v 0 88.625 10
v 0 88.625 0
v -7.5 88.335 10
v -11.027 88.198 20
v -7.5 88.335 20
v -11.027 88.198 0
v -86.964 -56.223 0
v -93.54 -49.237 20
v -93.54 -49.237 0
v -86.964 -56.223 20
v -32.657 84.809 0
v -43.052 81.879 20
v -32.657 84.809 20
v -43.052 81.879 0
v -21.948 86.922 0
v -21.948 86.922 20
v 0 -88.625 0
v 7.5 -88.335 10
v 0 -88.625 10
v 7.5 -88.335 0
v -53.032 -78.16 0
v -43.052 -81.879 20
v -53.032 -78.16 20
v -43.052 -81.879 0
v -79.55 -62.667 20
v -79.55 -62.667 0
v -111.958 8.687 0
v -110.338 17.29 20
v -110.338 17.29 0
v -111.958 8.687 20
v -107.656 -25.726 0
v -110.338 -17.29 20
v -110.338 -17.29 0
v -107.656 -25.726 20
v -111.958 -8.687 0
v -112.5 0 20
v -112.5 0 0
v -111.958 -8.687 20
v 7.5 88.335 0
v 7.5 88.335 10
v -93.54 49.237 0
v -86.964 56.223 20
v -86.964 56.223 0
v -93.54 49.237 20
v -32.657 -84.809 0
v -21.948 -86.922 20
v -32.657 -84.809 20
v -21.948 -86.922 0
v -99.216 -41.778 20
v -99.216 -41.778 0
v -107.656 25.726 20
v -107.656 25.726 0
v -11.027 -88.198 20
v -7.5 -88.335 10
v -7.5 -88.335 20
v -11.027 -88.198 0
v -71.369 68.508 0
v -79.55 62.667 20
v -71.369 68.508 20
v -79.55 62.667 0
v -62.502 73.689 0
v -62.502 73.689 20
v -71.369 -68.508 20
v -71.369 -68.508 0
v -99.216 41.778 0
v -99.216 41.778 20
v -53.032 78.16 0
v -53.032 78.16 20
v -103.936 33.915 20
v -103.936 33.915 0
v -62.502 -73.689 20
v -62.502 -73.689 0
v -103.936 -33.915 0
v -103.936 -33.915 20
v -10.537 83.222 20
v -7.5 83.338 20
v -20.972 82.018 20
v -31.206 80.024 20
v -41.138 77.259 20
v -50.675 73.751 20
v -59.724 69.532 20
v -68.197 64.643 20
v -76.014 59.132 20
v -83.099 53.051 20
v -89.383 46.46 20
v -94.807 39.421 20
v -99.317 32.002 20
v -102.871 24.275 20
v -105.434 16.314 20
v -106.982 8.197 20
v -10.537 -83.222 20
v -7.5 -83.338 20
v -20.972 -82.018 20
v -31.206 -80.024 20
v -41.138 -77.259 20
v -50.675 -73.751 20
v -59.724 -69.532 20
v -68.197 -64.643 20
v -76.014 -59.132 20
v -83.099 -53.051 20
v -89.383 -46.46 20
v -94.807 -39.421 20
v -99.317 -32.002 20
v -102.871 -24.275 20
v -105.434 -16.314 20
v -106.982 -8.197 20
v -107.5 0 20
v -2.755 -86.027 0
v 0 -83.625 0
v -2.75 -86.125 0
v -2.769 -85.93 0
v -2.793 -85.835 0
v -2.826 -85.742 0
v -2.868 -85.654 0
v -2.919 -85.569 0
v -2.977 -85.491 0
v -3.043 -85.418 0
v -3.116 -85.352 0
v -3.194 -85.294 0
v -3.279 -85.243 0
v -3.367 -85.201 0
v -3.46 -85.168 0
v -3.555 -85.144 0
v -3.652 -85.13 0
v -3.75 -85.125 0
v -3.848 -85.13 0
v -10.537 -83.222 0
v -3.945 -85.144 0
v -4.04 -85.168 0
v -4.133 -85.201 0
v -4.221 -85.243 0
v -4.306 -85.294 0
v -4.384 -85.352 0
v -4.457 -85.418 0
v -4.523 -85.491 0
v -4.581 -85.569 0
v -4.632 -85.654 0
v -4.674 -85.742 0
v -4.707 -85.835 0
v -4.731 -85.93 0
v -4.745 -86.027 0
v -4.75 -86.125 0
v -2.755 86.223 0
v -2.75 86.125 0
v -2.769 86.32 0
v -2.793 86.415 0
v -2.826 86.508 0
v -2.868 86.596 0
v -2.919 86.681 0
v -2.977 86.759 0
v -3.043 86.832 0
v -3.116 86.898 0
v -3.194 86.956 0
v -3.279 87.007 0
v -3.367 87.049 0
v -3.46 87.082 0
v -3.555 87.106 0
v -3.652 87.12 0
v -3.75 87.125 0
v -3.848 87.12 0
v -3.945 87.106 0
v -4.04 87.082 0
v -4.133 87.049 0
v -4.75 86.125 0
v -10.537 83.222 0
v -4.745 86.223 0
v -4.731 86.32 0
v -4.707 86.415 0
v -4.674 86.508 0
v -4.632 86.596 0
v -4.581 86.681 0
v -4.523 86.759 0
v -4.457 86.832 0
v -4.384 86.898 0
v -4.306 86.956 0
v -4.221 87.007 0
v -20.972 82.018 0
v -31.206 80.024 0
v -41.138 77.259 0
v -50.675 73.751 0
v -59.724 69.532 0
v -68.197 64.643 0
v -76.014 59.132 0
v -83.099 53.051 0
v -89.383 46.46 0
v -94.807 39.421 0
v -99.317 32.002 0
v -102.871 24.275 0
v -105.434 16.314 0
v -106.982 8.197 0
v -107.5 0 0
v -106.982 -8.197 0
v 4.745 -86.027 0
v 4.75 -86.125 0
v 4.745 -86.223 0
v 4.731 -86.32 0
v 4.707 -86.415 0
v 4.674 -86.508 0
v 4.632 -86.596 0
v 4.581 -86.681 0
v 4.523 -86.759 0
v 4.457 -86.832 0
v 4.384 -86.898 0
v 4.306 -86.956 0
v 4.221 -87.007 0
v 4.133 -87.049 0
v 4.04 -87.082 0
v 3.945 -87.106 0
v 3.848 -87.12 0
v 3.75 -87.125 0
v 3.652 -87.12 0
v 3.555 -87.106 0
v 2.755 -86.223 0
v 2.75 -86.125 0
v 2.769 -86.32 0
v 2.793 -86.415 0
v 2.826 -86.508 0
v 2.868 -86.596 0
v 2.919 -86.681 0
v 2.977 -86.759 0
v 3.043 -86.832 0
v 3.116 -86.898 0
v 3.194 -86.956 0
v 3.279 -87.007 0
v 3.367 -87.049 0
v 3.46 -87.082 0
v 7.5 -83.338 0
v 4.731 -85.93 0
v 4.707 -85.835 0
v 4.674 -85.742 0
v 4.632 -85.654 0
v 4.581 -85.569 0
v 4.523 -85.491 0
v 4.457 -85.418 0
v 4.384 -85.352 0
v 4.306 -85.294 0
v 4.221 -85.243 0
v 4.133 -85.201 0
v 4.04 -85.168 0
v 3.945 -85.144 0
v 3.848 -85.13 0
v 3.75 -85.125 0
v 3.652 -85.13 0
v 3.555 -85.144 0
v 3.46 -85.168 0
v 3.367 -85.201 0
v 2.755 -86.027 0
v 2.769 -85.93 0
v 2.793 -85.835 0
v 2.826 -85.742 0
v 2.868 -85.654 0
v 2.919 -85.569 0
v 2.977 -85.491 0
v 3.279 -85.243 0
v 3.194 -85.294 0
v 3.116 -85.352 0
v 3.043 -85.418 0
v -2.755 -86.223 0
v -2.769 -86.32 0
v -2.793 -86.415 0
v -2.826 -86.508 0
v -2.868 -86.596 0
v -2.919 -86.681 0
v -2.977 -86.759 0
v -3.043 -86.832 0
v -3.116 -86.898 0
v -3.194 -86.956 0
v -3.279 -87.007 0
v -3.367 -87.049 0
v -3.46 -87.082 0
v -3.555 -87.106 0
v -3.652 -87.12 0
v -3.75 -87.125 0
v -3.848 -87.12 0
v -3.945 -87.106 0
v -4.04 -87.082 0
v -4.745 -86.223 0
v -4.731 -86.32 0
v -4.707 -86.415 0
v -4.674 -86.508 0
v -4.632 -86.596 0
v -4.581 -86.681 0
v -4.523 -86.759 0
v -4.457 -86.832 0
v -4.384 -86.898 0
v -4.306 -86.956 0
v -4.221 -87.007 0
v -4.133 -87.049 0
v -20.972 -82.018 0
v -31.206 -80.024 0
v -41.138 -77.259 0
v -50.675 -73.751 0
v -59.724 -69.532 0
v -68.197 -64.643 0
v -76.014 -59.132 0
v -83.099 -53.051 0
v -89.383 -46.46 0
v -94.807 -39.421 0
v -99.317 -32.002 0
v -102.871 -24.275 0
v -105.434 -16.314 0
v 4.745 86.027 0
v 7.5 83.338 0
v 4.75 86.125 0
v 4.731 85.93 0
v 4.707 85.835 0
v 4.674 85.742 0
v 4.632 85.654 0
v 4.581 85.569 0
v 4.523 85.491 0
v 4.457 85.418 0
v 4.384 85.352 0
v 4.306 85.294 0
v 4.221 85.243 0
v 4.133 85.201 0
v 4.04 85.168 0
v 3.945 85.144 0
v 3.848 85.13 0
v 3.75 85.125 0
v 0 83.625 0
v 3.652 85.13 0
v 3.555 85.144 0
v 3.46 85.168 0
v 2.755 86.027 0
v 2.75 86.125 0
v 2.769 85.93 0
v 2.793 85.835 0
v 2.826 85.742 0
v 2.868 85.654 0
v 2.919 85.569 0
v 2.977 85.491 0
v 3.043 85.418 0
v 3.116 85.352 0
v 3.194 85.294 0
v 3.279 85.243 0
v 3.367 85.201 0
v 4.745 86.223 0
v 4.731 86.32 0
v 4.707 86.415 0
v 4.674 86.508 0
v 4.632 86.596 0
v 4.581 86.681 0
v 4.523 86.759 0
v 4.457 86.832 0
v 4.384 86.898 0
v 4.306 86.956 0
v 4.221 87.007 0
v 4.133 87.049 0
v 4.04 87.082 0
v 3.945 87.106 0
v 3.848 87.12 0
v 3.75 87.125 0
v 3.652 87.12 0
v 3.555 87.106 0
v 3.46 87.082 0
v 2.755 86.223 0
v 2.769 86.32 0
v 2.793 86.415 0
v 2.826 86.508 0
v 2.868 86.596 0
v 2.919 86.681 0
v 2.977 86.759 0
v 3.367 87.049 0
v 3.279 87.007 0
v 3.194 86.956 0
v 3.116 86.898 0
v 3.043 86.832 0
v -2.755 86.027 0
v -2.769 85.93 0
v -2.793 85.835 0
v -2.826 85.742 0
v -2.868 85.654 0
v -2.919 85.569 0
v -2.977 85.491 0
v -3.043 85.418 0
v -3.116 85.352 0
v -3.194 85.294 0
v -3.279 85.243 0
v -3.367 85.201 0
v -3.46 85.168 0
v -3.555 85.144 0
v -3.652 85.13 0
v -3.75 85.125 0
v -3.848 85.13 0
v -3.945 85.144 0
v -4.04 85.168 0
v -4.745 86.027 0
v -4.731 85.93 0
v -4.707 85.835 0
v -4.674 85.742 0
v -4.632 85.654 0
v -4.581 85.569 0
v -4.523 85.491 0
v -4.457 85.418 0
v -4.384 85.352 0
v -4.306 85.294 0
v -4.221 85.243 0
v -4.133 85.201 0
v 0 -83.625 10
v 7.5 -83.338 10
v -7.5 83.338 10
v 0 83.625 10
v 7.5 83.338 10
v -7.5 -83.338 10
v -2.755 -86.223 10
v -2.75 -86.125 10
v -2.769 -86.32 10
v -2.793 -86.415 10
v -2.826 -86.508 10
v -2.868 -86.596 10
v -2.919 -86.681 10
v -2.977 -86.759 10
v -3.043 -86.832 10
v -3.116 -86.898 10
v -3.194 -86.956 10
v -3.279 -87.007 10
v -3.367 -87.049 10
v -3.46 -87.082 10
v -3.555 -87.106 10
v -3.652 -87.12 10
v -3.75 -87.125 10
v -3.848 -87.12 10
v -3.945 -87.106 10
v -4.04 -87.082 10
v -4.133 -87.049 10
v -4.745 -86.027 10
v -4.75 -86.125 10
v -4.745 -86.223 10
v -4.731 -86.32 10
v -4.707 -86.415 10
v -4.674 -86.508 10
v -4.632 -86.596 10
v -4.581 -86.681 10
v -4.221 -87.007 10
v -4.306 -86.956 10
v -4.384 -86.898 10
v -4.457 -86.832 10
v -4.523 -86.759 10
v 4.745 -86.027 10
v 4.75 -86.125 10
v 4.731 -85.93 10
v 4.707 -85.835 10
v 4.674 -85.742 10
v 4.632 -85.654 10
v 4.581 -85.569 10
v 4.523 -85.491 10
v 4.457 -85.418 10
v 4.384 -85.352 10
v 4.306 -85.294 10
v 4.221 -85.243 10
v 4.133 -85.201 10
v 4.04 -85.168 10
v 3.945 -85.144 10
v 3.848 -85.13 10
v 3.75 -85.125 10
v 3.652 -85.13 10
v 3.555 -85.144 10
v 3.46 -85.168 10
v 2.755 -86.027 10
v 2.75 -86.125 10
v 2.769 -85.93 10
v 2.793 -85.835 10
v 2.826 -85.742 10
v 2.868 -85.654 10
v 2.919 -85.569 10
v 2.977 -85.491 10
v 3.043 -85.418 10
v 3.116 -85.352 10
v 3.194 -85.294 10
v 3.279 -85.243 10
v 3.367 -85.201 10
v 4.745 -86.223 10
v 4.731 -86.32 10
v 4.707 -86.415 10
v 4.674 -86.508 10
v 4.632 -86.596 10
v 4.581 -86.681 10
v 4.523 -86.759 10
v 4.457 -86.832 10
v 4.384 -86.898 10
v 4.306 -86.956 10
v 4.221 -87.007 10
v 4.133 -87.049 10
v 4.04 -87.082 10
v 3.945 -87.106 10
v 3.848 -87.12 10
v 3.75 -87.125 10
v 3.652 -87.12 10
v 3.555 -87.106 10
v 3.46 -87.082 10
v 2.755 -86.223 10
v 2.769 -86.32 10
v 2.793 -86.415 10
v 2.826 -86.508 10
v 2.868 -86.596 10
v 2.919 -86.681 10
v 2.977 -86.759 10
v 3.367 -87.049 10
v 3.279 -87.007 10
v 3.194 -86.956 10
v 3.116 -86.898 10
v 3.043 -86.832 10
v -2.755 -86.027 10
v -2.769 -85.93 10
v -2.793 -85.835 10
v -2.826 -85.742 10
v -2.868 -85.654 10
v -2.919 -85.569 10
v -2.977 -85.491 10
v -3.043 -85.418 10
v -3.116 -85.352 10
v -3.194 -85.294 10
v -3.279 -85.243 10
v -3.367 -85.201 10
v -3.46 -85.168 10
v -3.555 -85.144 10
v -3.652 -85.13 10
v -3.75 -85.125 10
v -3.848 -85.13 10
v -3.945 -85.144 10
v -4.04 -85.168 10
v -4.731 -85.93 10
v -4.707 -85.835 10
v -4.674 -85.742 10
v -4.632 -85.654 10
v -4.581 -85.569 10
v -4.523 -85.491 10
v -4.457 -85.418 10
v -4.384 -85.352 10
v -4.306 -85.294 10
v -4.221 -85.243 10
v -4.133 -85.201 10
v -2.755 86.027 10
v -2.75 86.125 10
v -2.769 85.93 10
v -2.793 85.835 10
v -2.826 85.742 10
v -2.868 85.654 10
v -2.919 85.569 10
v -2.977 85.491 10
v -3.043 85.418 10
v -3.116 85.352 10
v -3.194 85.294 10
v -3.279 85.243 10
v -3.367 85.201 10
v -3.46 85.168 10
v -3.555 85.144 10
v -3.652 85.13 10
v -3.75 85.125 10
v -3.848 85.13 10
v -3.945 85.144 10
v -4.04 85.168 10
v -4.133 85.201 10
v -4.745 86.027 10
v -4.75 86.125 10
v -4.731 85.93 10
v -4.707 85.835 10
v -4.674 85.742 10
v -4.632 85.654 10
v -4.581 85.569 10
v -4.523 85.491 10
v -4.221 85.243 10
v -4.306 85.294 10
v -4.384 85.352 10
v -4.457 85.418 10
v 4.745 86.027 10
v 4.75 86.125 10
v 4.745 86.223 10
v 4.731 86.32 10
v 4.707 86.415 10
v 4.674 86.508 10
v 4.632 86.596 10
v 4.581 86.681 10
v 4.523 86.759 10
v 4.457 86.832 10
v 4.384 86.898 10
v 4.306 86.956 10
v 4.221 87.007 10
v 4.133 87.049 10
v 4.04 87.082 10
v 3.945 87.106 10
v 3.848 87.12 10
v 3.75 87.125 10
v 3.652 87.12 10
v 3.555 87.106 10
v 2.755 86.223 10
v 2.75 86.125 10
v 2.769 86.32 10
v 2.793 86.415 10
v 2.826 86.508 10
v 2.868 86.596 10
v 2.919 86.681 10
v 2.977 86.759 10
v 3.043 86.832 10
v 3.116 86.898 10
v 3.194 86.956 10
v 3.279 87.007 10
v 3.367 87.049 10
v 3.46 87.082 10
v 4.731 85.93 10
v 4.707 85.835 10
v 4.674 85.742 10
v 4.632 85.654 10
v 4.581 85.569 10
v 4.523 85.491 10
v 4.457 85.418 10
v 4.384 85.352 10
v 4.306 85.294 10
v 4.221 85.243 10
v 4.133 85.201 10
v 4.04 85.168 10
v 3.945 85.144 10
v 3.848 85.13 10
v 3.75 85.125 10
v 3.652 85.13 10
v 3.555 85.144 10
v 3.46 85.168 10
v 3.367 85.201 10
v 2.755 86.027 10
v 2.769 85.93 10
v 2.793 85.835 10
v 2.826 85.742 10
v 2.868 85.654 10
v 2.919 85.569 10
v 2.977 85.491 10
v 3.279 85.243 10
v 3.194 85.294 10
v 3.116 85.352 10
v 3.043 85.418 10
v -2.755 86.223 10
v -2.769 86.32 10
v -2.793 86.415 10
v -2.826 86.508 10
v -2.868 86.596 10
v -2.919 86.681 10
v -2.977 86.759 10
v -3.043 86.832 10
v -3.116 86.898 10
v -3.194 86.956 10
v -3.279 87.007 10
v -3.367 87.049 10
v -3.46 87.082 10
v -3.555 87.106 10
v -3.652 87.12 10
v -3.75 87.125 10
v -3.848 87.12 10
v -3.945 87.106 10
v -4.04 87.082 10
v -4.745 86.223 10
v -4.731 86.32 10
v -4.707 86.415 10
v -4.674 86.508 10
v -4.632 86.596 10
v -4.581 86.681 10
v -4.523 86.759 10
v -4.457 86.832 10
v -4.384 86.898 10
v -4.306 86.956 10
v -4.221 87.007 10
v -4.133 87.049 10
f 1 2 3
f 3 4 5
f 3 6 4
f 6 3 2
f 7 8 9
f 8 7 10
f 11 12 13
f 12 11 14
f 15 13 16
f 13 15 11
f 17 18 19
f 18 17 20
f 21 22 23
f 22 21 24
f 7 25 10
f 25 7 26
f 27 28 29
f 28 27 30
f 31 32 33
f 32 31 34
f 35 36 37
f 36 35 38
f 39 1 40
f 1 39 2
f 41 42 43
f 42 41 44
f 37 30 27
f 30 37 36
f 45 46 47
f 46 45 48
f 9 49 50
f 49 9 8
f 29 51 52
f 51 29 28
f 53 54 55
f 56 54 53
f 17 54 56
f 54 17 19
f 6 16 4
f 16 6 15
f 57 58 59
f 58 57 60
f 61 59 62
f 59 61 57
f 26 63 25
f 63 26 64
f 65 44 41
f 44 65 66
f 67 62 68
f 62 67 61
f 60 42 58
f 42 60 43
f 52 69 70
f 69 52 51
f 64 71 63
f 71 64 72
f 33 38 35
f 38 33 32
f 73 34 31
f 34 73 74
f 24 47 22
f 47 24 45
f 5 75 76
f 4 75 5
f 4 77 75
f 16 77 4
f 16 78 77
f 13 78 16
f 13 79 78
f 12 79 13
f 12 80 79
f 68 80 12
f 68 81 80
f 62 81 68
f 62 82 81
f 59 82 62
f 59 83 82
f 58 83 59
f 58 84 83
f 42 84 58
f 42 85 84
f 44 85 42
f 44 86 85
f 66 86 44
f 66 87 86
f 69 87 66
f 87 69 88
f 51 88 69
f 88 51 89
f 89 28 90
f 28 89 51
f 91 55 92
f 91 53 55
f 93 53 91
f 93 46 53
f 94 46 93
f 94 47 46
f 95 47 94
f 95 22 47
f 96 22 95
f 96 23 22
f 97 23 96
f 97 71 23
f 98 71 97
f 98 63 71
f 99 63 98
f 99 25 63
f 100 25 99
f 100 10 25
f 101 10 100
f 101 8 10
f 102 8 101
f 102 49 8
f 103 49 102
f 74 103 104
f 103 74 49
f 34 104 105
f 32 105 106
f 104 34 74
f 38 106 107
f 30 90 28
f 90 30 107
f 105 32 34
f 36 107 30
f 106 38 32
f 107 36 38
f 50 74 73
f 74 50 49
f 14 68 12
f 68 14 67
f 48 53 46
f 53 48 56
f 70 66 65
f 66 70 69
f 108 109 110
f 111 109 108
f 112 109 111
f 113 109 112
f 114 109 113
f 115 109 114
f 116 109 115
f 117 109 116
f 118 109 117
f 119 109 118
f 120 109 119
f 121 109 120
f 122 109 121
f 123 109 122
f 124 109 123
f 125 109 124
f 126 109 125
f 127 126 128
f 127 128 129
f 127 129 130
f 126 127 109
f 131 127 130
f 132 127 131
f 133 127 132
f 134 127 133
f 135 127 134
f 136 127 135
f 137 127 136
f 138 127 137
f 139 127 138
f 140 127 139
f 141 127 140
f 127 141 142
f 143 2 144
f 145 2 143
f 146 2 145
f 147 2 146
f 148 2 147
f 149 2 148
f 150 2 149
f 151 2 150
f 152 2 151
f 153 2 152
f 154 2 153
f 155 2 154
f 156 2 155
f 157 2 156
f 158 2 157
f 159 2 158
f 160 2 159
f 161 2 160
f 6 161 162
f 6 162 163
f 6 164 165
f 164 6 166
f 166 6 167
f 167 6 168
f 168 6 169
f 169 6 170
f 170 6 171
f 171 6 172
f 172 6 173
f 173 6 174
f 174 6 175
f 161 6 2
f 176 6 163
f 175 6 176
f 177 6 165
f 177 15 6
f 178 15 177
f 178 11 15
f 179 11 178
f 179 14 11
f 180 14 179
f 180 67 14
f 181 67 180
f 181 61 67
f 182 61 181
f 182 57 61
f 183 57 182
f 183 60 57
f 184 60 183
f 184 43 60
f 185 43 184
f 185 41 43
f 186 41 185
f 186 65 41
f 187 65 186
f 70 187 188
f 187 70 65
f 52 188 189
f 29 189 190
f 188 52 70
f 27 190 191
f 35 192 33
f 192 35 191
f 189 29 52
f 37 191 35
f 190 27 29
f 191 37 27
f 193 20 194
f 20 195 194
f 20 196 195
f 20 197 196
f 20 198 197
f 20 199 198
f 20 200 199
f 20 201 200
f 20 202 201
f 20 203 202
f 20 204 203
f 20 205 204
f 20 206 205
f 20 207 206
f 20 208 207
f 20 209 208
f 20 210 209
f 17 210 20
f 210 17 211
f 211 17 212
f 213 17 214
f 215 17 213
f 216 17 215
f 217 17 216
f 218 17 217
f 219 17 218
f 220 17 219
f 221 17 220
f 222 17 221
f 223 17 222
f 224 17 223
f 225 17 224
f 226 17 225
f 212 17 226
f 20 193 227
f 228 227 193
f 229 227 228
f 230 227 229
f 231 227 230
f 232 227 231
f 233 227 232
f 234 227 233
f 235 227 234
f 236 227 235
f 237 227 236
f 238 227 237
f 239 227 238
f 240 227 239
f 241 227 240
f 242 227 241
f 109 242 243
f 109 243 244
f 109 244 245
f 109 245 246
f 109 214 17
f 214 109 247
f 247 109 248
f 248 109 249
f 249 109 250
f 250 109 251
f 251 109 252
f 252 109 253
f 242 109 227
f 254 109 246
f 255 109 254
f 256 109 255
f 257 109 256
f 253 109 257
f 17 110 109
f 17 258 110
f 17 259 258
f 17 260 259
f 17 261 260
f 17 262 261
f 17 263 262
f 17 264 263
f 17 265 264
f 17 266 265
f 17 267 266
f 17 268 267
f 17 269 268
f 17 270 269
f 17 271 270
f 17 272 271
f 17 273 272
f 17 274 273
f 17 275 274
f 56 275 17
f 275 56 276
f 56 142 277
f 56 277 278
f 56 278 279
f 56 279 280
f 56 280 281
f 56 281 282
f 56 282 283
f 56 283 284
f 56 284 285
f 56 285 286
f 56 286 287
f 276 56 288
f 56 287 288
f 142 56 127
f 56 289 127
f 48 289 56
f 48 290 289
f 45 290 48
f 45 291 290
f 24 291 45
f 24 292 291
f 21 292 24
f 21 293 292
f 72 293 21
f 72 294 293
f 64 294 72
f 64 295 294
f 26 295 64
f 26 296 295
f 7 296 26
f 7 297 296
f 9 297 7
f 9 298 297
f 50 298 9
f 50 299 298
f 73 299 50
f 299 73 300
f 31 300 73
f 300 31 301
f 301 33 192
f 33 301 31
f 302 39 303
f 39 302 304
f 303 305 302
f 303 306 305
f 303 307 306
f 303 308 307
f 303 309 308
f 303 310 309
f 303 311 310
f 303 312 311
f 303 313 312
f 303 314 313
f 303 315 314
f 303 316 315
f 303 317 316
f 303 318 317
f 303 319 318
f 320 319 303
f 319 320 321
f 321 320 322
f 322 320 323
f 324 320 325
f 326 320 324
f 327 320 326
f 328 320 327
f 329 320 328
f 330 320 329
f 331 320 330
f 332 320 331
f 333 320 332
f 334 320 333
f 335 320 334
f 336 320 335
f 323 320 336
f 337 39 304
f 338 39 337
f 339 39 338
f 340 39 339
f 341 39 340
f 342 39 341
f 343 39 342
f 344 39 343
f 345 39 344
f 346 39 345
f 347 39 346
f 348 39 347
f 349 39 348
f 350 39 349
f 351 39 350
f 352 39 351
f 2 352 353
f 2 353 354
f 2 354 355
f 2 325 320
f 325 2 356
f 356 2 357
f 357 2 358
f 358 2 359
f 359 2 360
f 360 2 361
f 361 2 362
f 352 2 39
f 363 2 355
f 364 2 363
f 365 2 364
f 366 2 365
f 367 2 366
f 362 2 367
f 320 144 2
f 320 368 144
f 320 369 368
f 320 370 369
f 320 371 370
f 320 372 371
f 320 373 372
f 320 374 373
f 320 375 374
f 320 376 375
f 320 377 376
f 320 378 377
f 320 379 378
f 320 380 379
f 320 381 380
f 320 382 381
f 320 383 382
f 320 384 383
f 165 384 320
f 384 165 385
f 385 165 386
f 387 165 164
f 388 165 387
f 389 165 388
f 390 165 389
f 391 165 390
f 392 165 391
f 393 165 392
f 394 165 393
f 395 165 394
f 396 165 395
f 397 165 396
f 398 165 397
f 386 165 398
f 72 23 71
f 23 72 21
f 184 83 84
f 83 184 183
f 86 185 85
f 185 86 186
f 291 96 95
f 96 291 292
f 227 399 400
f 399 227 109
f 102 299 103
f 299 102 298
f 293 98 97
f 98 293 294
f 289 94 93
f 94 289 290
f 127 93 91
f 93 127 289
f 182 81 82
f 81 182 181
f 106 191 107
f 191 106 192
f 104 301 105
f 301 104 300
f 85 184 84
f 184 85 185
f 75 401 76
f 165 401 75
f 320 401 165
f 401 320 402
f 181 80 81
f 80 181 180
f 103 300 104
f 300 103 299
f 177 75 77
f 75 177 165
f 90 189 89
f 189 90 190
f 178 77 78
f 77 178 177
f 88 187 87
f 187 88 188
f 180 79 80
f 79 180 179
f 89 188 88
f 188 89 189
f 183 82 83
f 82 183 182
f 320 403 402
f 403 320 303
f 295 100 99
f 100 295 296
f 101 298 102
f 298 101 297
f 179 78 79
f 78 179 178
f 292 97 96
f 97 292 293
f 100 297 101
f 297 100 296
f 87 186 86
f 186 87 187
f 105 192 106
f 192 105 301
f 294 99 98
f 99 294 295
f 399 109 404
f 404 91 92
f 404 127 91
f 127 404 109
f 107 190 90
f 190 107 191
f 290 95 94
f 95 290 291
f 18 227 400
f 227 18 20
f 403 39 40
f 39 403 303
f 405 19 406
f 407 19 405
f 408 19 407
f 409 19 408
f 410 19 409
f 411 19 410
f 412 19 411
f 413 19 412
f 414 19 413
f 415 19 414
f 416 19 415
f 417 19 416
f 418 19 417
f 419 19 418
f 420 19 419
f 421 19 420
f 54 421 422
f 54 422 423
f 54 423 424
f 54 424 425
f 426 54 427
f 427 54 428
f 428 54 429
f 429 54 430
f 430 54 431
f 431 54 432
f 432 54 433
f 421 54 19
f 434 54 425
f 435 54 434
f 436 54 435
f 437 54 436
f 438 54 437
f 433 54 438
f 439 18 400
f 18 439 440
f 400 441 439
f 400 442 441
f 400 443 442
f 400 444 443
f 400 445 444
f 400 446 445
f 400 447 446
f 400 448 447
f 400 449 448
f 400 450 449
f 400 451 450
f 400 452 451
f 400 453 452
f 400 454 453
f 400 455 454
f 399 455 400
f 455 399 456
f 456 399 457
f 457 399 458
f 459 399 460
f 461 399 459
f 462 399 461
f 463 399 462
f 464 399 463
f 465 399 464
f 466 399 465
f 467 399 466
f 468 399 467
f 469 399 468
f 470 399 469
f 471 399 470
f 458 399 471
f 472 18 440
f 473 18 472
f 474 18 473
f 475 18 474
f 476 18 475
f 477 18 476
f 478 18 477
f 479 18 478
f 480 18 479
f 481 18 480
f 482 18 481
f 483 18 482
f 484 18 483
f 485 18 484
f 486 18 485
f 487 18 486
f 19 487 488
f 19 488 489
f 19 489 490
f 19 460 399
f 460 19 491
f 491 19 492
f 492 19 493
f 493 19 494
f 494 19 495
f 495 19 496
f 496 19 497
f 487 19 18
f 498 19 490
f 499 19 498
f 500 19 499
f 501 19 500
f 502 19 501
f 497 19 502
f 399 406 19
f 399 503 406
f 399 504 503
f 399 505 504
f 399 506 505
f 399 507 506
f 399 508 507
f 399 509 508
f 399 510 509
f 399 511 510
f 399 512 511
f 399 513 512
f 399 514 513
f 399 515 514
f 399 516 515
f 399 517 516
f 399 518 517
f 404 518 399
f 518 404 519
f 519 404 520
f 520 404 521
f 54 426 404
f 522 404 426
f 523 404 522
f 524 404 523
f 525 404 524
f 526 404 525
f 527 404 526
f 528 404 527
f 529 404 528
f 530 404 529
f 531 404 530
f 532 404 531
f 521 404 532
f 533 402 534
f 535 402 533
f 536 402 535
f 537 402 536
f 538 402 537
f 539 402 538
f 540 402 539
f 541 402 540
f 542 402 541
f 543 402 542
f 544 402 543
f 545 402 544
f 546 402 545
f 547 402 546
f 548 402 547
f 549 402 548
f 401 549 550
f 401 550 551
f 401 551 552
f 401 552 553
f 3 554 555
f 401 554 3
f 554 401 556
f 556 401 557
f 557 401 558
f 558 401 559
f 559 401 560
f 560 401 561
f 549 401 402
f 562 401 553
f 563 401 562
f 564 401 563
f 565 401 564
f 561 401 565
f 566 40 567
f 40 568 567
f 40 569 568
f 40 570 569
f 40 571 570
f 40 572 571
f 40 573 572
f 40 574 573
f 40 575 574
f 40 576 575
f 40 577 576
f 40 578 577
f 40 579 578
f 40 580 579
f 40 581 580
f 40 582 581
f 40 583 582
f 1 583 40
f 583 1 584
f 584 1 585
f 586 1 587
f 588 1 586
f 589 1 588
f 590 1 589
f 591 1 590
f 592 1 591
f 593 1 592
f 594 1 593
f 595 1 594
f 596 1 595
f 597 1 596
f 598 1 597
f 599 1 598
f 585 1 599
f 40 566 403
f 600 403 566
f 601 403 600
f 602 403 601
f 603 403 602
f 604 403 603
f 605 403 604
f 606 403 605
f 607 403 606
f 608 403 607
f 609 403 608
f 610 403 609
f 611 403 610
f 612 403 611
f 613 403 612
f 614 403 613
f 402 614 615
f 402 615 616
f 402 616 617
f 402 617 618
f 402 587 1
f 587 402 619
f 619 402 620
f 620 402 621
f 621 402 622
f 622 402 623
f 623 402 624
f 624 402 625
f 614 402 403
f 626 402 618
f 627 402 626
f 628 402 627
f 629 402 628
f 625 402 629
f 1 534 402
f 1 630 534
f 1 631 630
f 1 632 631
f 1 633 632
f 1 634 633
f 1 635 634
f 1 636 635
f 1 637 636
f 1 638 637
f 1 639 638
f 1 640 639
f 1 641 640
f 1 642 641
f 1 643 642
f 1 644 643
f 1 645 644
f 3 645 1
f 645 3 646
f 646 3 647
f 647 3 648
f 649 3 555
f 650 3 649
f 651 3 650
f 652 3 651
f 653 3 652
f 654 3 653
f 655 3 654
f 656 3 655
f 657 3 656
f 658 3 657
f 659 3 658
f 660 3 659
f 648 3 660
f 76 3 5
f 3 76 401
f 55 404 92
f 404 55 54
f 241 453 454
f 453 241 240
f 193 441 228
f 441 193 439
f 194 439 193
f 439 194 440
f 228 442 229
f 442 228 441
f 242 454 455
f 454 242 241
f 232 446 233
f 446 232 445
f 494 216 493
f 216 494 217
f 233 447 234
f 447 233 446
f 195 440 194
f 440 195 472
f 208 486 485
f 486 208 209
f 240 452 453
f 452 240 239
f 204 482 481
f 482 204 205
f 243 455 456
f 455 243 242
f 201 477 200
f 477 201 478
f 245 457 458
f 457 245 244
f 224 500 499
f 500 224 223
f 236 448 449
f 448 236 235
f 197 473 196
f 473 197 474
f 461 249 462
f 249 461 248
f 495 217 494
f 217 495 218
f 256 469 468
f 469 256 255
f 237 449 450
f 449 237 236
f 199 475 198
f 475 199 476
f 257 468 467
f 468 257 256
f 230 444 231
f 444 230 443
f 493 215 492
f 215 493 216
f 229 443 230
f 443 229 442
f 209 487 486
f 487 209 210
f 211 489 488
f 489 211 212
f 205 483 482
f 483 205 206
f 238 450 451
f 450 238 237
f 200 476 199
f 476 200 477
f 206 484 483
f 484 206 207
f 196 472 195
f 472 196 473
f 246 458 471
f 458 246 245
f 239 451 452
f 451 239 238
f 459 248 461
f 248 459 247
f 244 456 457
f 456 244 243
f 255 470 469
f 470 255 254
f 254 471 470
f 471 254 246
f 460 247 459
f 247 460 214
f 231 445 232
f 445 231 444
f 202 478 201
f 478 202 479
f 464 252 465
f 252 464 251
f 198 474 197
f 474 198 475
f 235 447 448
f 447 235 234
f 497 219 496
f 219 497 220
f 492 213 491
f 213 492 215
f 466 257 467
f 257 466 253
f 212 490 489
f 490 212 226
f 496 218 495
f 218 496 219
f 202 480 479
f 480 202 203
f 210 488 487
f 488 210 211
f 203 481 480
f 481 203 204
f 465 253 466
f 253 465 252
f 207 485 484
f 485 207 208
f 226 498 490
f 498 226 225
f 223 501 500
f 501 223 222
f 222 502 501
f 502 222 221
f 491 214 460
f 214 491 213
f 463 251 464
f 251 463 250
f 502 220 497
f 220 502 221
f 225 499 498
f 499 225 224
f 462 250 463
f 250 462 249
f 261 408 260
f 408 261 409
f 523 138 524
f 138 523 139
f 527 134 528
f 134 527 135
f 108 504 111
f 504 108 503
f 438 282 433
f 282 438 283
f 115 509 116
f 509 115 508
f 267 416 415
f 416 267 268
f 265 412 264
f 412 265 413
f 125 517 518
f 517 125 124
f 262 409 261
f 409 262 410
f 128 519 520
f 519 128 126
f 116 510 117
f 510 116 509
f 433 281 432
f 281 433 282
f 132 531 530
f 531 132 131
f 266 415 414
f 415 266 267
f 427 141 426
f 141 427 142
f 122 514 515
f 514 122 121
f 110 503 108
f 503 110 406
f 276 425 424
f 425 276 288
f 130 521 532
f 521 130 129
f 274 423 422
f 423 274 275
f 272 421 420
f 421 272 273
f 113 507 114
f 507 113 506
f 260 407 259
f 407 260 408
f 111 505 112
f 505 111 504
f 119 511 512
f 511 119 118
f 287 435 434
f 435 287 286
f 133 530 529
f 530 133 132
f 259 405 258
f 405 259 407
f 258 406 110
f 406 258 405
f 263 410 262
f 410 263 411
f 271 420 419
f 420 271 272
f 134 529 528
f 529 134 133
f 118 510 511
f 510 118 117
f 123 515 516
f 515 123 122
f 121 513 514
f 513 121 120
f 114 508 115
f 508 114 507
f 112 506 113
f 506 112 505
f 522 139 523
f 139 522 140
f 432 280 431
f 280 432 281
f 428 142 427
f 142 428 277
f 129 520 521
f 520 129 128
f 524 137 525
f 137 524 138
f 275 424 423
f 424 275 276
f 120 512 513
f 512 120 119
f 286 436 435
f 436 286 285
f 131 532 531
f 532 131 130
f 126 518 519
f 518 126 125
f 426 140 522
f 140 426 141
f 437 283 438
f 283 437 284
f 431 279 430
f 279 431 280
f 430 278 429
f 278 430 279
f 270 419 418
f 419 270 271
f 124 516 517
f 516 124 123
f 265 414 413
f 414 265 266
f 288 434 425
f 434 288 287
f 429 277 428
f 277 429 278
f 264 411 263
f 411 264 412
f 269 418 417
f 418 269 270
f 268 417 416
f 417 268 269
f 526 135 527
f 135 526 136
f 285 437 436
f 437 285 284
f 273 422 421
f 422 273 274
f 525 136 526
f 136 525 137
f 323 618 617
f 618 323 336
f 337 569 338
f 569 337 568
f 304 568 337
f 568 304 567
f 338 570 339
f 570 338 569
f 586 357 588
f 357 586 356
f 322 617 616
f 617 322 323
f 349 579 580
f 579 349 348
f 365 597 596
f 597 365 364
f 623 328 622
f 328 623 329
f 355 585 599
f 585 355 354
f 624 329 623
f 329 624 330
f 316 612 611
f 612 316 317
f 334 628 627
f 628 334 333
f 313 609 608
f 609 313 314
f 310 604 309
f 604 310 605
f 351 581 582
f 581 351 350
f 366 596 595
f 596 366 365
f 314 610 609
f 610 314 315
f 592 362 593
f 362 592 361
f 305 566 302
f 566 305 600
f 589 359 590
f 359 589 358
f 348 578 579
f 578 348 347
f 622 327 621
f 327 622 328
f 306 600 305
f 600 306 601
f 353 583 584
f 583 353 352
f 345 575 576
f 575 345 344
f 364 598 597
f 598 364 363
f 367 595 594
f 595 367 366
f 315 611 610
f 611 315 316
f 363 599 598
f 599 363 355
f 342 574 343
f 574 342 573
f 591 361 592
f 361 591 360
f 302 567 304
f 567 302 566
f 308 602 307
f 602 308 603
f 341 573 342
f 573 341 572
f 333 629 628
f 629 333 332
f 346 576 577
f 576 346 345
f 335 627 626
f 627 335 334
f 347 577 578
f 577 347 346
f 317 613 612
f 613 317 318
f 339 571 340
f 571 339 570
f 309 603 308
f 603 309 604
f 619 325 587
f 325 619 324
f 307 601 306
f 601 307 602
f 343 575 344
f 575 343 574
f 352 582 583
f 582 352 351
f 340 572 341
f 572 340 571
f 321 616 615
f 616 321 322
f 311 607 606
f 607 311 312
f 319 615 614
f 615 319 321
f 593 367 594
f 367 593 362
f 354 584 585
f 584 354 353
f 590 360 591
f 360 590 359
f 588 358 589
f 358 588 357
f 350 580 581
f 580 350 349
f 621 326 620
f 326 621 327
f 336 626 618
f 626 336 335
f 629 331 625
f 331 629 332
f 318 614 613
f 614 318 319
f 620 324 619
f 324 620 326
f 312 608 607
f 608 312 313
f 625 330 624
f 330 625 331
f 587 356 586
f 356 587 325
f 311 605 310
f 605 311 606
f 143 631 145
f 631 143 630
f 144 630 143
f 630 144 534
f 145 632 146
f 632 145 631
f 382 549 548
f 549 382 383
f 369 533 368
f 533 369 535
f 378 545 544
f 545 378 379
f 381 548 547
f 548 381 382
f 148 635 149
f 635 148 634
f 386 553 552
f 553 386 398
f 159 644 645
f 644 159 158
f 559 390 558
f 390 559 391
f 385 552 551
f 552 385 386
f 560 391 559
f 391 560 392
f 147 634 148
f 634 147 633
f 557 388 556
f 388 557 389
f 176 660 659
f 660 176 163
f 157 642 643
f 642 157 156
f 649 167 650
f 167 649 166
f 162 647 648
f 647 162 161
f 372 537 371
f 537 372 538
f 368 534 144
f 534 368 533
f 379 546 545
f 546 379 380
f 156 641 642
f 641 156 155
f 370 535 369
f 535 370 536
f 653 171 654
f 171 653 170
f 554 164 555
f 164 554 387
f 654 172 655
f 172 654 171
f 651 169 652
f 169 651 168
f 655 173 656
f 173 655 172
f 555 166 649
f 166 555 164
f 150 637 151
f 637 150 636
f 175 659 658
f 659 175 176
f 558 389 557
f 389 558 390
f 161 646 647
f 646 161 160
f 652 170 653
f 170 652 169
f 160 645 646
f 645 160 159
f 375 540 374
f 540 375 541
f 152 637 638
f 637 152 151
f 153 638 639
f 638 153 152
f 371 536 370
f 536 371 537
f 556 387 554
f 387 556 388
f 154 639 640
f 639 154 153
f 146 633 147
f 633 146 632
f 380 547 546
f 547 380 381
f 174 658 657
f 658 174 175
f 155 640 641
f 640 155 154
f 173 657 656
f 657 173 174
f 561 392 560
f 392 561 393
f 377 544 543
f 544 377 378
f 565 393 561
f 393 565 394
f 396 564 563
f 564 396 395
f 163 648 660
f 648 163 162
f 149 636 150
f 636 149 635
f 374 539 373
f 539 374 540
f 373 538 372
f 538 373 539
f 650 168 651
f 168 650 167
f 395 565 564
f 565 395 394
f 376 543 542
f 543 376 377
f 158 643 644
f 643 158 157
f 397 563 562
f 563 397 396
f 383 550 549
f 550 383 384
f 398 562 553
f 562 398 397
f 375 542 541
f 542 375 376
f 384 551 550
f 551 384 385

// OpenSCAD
// file: formwork_oval.scad
$fn = 64;

/* elliptical_cylinder BEGIN */
module elliptical_cylinder(major, minor, height) {
    scale([major / 2, minor / 2, 1])
        cylinder(d = 2, h = height);
}
/* elliptical_cylinder END */

/* elliptical_formwork BEGIN */
module elliptical_formwork(outer_major, outer_minor, wall, height) {
    difference_shape_height = height * 2;

    difference() {
        elliptical_cylinder(outer_major + 2 * wall, outer_minor + 2 * wall, height);
        translate(
            [
            0,
            0,
                -difference_shape_height / 4
            ]
        ) {
            elliptical_cylinder(outer_major, outer_minor, difference_shape_height);
        }
    }
}
/* elliptical_formwork END */

// elliptical_formwork_with_cutouts BEGIN
module elliptical_formwork_with_cutouts(outer_major, outer_minor, wall, height, key) {
    difference() {
        difference() {
            difference_shape_height = height * 2;
            color("green") elliptical_formwork(outer_major, outer_minor, wall, height);

            translate(
                [
                        outer_minor / 2 + key / 2,
                0,
                    difference_shape_height / 4
                ]
            ) {
                cube(
                    [outer_minor, outer_major, difference_shape_height],
                center = true
                );
            }
        }

        translate(
            [
                0,
            0,
                    height / 2 + height / 4
            ]
        ) {
            cube(
                [key, outer_minor + wall * 2, height / 2],
            center = true
            );
        }

        translate(
            [
                key / 4,
                    -outer_minor / 2 - wall / 2,
                height / 4
            ]
        ) {
            #cylinder(
            height,
            1,
            1,
            center = true
            );
        }

        translate(
            [
                    +key / 4 - key / 2,
                    -outer_minor / 2 - wall / 2,
                height / 4
            ]
        ) {
            #cylinder(
            height,
            1,
            1,
            center = true
            );
        }

        translate(
            [
                key / 4,
                    outer_minor / 2 + wall / 2,
                height / 4
            ]
        ) {
            #cylinder(
            height,
            1,
            1,
            center = true
            );
        }

        translate(
            [
                    +key / 4 - key / 2,
                    outer_minor / 2 + wall / 2,
                height / 4
            ]
        ) {
            #cylinder(
            height,
            1,
            1,
            center = true
            );
        }
    }
}
// elliptical_formwork_with_cutouts END
// main file
use <formwork_oval.scad>;

$fn = 256;

/* render BEGIN */
key_width = 15;
radius_small = 167.25;
wall_thickness = 5;
radius_big = 215;
wall_height = 20;

elliptical_formwork_with_cutouts(radius_big, radius_small, wall_thickness, wall_height, key_width);
/* render END */
